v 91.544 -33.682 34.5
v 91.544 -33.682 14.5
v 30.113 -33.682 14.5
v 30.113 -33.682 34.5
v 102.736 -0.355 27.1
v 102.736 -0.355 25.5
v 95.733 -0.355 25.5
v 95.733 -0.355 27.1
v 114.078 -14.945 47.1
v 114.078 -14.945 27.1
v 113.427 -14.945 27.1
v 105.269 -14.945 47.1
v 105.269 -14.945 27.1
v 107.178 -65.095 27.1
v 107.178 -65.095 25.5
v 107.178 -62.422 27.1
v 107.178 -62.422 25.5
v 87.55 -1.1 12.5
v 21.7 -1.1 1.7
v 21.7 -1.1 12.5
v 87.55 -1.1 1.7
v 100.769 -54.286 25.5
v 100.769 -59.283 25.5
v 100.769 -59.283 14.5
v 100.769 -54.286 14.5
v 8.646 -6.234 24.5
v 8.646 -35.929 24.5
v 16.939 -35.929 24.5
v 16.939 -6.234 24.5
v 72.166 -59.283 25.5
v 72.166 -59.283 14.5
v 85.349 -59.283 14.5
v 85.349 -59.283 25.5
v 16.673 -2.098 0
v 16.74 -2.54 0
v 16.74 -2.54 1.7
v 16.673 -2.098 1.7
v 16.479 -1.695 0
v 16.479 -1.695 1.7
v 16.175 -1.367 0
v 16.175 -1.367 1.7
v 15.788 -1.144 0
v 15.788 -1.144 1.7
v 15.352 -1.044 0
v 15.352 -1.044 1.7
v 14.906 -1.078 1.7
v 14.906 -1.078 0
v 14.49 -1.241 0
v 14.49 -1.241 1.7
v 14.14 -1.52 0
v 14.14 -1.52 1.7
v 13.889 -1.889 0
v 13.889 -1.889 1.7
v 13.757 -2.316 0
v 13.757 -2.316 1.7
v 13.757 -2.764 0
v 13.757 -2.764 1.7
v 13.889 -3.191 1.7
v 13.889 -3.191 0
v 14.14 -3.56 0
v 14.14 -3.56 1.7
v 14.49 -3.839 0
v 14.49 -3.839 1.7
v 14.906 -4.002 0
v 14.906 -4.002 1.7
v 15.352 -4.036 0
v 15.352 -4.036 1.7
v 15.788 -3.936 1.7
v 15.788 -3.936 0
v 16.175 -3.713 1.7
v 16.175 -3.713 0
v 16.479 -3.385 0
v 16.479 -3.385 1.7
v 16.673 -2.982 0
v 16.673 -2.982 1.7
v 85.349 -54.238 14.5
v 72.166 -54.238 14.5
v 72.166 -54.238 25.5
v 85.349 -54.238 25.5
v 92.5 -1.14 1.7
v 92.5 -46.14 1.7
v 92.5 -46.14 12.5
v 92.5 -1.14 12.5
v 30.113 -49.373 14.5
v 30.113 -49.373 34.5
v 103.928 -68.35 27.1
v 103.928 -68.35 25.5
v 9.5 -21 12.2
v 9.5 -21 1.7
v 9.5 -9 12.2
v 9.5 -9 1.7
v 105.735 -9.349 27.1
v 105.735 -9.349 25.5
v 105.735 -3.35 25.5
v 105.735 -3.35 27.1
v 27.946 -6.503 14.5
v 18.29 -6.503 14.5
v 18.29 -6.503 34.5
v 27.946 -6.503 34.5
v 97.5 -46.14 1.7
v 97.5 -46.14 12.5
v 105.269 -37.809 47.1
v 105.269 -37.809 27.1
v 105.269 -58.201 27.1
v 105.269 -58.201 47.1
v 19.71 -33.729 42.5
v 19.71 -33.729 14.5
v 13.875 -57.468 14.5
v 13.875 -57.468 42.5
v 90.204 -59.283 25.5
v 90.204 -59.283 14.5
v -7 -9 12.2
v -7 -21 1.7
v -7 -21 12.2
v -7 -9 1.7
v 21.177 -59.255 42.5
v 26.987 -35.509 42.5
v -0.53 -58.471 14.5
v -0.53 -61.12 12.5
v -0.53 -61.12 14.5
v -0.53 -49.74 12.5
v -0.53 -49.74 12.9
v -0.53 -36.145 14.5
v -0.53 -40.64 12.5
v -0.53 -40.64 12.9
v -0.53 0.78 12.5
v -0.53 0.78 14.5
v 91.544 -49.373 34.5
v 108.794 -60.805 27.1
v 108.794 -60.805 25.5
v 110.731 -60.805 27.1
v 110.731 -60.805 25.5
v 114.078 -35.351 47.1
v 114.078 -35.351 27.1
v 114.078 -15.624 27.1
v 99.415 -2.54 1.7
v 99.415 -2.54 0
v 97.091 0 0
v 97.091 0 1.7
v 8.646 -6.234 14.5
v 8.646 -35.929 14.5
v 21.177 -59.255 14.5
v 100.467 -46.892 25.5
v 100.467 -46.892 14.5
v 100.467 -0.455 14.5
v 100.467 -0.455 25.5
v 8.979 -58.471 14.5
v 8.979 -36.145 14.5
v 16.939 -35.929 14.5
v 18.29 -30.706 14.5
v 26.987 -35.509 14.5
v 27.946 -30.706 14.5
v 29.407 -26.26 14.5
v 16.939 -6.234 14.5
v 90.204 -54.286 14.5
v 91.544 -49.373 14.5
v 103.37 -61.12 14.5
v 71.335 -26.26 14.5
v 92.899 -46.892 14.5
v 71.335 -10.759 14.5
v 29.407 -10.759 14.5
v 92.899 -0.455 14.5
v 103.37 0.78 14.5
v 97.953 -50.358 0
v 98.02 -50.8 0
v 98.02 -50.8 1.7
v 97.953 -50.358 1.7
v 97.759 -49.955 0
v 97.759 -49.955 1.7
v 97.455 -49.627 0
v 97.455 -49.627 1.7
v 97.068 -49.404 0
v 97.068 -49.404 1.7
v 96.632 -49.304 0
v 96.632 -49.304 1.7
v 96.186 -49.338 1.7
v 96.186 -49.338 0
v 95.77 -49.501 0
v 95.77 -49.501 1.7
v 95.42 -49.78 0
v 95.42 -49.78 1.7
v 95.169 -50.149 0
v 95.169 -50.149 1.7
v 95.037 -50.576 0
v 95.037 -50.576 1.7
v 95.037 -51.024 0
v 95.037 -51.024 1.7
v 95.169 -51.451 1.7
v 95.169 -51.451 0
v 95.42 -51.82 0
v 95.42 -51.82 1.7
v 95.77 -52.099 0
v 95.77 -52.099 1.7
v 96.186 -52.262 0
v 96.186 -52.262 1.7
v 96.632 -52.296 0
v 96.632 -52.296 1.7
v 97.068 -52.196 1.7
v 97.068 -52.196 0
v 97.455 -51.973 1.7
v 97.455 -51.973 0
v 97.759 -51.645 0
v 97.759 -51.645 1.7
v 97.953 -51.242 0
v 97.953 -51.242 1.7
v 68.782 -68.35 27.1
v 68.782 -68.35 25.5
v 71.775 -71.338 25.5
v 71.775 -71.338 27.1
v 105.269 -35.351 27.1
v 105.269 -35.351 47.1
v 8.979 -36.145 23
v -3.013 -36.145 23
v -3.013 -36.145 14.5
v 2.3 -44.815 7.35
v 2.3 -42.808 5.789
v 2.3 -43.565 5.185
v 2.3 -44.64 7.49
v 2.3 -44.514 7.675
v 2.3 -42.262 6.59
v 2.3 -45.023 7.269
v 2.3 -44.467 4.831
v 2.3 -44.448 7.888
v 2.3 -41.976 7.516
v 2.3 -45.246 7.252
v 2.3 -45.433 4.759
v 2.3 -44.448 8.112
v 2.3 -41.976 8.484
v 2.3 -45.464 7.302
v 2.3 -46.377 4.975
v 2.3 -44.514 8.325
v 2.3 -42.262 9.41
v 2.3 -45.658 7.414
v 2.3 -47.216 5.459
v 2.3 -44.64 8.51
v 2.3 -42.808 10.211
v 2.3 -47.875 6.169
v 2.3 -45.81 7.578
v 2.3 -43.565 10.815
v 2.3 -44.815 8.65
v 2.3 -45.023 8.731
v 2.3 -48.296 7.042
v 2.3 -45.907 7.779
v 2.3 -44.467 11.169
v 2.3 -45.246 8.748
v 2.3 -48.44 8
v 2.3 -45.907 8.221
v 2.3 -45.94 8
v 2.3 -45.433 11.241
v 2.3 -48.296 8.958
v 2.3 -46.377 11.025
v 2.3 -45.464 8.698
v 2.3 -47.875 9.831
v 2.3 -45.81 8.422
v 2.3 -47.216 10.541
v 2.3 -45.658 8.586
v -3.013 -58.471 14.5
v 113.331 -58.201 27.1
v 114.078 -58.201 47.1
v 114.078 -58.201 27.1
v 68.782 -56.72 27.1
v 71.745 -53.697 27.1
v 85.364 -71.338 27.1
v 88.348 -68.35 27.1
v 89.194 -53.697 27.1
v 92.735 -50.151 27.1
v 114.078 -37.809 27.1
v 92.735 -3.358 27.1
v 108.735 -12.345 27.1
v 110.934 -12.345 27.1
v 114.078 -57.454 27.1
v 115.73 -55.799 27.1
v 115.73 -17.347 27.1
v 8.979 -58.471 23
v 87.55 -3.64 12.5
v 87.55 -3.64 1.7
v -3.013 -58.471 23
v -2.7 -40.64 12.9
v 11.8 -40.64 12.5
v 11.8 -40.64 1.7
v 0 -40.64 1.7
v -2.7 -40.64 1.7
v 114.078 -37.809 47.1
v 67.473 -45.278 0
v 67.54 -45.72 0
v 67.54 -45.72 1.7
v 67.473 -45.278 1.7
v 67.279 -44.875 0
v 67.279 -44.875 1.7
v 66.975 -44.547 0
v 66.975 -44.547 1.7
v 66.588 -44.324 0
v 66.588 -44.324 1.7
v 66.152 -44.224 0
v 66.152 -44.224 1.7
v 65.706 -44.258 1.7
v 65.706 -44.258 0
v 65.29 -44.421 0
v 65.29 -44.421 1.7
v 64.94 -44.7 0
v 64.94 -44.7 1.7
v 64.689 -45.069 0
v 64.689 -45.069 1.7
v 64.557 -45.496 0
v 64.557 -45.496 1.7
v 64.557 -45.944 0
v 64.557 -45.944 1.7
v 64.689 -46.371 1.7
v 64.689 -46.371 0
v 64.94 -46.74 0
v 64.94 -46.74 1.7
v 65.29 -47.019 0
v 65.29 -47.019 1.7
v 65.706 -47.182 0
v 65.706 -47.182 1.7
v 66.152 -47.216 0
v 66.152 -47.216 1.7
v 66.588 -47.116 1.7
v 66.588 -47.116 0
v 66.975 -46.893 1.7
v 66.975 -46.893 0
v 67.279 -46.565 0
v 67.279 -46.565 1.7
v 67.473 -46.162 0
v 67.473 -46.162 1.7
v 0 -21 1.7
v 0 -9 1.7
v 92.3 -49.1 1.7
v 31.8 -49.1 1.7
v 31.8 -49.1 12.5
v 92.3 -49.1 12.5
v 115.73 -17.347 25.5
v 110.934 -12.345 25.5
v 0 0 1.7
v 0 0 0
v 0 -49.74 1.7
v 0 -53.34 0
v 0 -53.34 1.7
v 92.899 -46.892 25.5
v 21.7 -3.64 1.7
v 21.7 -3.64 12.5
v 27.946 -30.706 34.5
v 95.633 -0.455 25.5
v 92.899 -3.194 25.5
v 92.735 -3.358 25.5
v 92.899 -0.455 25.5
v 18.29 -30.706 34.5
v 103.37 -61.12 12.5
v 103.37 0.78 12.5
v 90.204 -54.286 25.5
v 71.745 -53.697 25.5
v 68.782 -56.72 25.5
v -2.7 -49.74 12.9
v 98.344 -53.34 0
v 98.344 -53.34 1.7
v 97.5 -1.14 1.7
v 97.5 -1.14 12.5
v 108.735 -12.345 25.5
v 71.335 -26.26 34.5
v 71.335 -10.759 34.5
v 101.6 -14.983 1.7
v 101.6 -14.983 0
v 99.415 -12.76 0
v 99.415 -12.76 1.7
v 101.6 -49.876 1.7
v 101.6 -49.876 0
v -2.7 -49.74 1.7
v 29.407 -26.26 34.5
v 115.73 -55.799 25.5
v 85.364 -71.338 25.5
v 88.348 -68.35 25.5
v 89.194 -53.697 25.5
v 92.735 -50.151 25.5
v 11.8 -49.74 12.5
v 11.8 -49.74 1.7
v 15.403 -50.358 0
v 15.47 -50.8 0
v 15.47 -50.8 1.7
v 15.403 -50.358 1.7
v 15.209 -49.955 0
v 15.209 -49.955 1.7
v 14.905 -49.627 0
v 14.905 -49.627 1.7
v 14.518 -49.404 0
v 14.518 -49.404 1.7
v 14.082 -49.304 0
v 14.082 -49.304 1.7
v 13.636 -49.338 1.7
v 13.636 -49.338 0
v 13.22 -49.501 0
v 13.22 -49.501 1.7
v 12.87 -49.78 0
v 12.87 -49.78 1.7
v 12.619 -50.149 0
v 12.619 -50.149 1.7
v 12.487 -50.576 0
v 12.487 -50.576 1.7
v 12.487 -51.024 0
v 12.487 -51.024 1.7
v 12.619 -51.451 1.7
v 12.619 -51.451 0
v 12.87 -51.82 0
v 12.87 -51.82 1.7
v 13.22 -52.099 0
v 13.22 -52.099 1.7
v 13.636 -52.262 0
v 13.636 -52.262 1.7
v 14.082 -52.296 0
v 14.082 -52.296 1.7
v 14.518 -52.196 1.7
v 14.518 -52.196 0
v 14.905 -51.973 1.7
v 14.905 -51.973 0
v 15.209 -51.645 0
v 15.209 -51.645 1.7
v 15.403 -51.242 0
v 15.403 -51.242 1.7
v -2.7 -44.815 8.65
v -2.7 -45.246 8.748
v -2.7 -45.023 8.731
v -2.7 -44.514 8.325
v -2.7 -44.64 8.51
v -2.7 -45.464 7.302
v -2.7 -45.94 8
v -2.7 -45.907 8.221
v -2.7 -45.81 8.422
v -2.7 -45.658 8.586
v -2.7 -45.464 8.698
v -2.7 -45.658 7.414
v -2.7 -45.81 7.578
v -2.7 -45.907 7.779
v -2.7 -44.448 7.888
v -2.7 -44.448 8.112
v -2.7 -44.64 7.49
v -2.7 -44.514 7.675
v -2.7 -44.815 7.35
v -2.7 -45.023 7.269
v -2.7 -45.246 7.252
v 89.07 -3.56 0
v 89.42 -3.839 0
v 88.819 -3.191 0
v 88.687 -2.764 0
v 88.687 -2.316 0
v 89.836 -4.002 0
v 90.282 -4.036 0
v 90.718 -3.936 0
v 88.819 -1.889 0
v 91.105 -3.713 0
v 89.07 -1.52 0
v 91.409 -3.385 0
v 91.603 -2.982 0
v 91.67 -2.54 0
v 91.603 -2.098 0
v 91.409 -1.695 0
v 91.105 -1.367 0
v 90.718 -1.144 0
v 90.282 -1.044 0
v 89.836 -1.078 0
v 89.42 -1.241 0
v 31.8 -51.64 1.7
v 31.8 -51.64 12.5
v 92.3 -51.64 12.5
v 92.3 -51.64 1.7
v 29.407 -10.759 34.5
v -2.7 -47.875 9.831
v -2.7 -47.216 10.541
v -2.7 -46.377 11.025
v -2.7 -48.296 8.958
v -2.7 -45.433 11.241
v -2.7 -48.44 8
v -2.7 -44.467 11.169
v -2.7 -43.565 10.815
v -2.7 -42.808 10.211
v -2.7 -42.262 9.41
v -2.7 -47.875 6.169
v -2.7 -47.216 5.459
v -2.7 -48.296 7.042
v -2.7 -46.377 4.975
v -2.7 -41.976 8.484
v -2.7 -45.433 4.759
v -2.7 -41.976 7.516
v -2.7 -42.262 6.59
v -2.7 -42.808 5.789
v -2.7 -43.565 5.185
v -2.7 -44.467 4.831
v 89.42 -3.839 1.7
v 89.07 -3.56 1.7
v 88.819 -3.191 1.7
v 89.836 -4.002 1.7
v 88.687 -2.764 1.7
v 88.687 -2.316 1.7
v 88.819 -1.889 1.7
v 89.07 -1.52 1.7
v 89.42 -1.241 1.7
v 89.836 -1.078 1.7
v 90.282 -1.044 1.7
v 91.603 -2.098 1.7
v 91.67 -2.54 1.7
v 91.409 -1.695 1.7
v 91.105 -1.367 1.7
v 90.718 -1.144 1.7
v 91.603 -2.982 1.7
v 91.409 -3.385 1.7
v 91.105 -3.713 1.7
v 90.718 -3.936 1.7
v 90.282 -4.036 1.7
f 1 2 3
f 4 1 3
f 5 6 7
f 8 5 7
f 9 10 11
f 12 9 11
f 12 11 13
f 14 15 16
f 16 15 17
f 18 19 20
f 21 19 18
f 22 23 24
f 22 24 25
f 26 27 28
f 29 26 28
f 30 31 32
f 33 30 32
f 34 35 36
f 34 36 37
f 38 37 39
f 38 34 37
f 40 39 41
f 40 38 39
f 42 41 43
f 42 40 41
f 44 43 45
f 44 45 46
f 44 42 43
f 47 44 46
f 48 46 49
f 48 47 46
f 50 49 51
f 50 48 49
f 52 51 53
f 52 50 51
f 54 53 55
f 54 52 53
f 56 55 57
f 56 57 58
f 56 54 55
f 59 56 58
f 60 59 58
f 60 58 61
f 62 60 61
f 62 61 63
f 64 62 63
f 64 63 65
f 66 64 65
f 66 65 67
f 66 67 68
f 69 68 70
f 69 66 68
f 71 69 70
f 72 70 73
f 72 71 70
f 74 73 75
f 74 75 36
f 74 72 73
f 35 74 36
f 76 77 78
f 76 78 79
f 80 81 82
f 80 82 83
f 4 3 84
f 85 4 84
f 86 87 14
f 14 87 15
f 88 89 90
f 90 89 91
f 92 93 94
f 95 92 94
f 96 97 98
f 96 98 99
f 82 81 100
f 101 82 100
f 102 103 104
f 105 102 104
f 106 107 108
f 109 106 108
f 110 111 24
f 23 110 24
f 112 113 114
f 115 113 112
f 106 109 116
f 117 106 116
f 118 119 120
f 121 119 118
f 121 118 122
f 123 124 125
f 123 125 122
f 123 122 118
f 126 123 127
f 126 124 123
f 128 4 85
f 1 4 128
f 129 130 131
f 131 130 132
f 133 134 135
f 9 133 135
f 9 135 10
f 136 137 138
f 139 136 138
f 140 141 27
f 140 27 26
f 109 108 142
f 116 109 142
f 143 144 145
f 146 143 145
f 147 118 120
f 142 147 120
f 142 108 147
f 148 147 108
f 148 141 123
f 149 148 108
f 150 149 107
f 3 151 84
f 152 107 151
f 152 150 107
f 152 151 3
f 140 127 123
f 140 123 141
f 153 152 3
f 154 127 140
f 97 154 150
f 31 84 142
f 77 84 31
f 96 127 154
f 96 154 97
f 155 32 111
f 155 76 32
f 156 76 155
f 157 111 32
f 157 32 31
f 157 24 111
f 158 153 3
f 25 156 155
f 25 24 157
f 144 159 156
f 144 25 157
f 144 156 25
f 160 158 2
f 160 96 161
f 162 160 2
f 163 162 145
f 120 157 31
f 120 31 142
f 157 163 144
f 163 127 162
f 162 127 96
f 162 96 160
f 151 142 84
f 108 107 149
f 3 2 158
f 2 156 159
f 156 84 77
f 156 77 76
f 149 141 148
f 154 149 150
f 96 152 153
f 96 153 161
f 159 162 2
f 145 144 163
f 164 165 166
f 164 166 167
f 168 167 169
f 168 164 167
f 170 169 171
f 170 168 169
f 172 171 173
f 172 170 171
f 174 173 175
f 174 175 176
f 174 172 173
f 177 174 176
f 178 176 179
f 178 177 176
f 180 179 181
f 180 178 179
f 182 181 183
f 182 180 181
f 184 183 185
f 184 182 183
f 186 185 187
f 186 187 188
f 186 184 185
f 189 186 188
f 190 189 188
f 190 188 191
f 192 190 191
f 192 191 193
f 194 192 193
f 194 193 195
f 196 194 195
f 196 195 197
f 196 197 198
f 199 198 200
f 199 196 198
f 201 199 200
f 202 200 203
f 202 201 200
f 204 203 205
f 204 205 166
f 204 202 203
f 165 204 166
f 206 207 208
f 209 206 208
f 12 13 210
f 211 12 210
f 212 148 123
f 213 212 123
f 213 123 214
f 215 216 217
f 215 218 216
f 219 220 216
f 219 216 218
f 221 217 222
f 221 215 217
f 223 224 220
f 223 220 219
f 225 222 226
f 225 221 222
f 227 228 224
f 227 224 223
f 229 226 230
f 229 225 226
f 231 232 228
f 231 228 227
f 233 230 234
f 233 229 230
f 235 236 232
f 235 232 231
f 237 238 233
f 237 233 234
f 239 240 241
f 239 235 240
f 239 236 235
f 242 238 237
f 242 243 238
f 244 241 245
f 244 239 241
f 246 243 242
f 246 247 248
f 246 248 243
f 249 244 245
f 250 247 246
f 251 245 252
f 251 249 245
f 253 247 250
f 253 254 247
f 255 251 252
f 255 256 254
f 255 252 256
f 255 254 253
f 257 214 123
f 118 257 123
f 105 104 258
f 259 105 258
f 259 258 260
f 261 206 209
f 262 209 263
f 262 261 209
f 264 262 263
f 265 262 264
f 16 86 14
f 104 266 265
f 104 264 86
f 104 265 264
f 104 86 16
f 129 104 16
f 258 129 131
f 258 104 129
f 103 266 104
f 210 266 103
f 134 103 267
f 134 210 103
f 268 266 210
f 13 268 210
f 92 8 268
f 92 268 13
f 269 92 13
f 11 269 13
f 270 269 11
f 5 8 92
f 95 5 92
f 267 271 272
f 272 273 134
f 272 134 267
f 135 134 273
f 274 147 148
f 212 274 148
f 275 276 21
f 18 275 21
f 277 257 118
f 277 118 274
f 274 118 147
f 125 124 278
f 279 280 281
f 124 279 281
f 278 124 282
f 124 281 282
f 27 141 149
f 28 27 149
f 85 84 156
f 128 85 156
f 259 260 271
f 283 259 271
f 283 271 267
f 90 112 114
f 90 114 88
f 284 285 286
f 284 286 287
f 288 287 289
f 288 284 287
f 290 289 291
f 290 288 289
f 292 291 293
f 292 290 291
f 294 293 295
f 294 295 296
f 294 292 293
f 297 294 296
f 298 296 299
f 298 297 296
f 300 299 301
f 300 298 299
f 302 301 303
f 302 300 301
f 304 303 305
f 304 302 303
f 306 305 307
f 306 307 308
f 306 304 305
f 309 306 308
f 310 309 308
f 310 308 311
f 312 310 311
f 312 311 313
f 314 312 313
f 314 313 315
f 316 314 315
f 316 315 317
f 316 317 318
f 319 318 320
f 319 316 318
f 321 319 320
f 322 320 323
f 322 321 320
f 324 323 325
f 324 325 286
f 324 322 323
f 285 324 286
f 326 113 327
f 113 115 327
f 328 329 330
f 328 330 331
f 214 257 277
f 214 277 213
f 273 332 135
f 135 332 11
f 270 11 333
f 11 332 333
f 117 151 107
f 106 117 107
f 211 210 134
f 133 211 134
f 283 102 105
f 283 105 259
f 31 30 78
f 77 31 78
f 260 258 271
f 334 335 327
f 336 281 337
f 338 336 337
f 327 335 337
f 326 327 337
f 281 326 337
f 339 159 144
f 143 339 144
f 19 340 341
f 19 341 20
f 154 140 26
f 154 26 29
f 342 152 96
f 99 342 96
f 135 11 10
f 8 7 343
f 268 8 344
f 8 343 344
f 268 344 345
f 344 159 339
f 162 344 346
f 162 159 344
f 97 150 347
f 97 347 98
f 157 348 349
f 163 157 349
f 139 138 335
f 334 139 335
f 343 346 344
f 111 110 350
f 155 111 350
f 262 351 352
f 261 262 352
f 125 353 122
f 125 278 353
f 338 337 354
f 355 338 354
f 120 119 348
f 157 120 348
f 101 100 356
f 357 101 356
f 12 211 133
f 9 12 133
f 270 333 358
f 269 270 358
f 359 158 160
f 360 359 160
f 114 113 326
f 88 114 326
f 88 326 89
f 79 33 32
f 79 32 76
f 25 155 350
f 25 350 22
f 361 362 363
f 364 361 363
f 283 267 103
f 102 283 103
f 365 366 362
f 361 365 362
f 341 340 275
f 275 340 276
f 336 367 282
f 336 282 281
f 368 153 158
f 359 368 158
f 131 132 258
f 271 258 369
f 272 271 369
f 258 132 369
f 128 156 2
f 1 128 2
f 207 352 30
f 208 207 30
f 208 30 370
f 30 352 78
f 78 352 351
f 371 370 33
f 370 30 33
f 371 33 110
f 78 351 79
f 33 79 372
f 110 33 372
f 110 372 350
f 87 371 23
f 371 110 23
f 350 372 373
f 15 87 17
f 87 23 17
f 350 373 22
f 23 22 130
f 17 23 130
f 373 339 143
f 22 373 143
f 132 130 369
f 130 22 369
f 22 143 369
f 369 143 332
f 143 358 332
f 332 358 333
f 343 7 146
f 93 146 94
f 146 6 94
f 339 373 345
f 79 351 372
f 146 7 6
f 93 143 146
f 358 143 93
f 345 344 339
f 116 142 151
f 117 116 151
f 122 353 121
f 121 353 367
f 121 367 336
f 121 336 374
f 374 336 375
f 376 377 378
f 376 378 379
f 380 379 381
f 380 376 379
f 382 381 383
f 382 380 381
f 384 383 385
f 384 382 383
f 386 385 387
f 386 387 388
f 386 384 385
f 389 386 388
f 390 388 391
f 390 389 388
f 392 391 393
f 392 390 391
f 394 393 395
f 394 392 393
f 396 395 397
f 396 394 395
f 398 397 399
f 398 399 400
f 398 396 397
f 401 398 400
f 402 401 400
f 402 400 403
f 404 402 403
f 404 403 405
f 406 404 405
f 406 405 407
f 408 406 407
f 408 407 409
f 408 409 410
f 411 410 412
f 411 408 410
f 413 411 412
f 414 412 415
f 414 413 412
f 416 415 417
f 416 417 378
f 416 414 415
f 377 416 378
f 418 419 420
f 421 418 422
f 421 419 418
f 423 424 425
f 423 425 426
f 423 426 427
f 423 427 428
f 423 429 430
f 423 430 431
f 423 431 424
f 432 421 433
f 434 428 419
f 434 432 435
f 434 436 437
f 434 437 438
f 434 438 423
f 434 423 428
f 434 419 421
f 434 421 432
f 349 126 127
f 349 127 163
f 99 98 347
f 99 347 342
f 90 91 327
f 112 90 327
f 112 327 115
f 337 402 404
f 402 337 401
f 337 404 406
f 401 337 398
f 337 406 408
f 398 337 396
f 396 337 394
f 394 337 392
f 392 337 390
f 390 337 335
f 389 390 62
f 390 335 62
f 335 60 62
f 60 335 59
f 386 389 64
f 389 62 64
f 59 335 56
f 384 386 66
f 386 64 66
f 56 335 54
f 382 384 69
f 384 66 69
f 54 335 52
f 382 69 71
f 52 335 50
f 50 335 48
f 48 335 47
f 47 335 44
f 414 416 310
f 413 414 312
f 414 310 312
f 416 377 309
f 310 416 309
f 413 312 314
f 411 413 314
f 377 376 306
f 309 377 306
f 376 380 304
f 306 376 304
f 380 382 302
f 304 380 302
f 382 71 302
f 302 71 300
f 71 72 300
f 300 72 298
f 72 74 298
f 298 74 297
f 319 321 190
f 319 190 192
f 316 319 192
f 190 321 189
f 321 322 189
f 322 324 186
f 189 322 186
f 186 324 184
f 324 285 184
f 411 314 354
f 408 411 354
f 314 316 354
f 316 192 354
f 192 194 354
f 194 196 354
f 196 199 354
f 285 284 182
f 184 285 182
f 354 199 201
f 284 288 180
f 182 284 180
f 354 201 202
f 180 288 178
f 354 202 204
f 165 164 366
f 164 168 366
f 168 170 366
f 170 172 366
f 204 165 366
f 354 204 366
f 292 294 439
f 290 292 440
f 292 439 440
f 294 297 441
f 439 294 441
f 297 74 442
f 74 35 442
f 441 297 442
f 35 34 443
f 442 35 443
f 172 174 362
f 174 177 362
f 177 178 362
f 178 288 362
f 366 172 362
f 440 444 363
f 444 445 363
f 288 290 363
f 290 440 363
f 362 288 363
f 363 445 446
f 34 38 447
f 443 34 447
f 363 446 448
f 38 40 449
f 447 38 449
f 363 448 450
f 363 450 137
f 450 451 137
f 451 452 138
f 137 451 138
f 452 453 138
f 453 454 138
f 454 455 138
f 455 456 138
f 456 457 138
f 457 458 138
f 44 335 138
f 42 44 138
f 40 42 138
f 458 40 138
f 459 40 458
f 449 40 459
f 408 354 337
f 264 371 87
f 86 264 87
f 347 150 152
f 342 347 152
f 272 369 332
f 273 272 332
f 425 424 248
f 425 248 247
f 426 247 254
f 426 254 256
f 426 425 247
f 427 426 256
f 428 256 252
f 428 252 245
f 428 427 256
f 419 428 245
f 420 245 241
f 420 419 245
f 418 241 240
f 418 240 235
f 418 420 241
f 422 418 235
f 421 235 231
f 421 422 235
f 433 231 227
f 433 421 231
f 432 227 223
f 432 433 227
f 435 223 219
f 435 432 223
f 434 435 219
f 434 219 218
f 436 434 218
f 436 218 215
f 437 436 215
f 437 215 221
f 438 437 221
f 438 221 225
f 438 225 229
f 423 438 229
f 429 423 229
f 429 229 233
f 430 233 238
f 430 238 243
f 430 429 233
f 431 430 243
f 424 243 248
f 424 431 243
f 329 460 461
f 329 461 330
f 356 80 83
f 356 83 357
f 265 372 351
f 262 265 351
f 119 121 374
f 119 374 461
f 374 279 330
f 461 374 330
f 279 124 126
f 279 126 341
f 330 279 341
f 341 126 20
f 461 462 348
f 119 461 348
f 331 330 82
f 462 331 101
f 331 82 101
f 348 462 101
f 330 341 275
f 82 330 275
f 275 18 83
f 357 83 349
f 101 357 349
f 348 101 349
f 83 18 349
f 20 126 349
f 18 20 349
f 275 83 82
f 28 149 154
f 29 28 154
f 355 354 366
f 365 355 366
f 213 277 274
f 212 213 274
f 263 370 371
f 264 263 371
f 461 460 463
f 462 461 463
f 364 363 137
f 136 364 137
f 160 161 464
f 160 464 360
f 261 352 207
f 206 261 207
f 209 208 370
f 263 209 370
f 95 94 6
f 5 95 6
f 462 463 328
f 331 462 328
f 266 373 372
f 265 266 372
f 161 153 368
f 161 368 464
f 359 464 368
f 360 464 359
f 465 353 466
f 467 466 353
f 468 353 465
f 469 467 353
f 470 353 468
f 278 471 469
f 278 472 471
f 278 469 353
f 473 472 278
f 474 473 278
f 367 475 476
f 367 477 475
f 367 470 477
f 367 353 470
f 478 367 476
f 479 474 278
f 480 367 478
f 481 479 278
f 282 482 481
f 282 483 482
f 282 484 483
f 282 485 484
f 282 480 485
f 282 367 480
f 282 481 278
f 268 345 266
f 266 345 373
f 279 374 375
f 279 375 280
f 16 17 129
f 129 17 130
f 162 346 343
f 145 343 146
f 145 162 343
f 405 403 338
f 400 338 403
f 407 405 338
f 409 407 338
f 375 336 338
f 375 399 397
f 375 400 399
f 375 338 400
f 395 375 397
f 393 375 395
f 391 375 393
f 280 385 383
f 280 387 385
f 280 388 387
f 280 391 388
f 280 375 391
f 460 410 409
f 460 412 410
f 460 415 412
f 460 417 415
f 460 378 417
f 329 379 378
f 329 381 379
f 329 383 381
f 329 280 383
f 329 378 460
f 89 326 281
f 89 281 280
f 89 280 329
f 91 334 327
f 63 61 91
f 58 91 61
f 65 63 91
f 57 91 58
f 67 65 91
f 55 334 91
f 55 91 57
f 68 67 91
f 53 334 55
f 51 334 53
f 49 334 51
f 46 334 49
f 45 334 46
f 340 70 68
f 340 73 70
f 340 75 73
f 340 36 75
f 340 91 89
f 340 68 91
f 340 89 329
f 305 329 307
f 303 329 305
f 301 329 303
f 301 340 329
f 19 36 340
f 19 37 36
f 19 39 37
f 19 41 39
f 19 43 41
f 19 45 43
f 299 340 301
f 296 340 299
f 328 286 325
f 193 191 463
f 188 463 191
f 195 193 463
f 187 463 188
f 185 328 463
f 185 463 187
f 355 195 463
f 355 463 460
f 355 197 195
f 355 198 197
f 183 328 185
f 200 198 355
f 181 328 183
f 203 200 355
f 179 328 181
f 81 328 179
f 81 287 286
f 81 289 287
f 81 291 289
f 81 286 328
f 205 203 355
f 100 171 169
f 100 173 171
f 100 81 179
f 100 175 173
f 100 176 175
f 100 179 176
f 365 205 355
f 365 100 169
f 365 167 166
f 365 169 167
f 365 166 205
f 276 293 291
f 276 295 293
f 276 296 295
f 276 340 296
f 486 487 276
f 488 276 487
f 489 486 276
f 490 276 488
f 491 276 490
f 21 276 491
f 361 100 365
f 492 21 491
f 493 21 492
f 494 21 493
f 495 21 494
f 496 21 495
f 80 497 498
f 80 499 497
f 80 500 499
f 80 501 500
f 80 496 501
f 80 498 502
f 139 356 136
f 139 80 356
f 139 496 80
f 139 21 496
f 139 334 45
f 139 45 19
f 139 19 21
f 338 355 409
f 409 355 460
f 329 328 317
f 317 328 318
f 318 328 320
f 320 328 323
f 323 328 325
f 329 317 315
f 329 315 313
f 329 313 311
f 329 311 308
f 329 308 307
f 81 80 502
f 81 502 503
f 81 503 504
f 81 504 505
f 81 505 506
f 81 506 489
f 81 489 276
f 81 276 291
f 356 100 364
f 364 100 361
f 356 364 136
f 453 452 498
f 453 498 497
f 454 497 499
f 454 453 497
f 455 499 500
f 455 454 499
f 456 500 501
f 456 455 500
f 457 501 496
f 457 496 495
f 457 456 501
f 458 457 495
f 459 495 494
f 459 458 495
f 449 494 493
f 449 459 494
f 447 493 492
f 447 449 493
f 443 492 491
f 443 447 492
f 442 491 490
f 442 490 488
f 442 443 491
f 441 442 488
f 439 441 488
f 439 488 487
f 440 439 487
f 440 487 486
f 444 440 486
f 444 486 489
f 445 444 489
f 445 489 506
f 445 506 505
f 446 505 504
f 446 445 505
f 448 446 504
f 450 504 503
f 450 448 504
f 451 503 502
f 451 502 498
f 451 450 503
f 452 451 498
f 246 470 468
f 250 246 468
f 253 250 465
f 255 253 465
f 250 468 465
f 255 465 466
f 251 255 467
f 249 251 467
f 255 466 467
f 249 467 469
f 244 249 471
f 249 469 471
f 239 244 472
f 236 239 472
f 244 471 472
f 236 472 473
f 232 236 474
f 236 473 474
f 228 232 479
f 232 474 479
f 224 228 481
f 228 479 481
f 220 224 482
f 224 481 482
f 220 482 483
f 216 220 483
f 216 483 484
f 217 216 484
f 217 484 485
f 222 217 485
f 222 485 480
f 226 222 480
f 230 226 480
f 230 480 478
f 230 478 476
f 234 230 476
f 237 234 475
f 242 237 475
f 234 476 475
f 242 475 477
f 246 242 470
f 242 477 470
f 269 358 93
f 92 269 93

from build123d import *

# Parameters (mm, degrees)
F0_R      = 1.5
F1_DEPTH  = 1.7
F2_W      = 11.8
F2_H      = 9.1
F2_W_2    = 2.7
F3_DEPTH  = 11.2
F4_R      = 3.25
F4_R_2    = 0.75
F5_DEPTH  = 5
F2_W_3    = 9.5
F2_H_2    = 12
F2_W_4    = 7
F6_DEPTH  = 10.5
F2_W_5    = 65.85
F2_H_3    = 2.54
F2_W_6    = 5
F2_H_4    = 45
F2_W_7    = 60.5
F7_DEPTH  = 10.8
F9_W      = 103.9
F9_H      = 61.9
F10_DEPTH = 2
F11_W     = 2.4829882507
F11_H     = 22.3256796598
F11_W_2   = 9.5090560305
F12_DEPTH = 8.5
F11_W_3   = 8.2931313664
F11_H_2   = 29.6949772164
F13_DEPTH = 10
F11_W_4   = 9.6561443061
F11_H_3   = 24.203886278
F14_DEPTH = 20
F15_DEPTH = 28
F11_W_5   = 41.9279932976
F11_H_4   = 15.5006516725
F16_DEPTH = 20
F11_W_6   = 13.1828933954
F11_H_5   = 5.0447173417
F11_W_7   = 10.5653479695
F11_H_6   = 4.9971267581
F11_W_8   = 7.5681805611
F11_H_7   = 46.4369145338
F17_DEPTH = 11
F20_DEPTH = 1.6
F22_DEPTH = 20


with BuildPart() as f1:
    # F0 (on Top) → F1 (new body)
    with BuildSketch(Plane.XY):
        Polygon((97.0912873745, 0), (0, 0), (0, -53.34), (98.3443260193, -53.34), (101.6, -49.8757660389), (101.6, -14.9831408635), (99.4149968028, -12.760464102), (99.4149968028, -2.54), align=None)
        with Locations((13.97, -50.8)):
            Circle(F0_R, mode=Mode.SUBTRACT)
        with Locations((66.04, -45.72)):
            Circle(F0_R, mode=Mode.SUBTRACT)
        with Locations((96.52, -50.8)):
            Circle(F0_R, mode=Mode.SUBTRACT)
        with Locations((15.24, -2.54)):
            Circle(F0_R, mode=Mode.SUBTRACT)
        with Locations((90.17, -2.54)):
            Circle(F0_R, mode=Mode.SUBTRACT)
    extrude(amount=F1_DEPTH)

    # F2 (on face) → F3 (join)
    with BuildSketch(Plane.XY.offset(1.7)):
        with Locations((5.9, -45.19)):
            Rectangle(F2_W, F2_H)
        with Locations((-1.35, -45.19)):
            Rectangle(F2_W_2, F2_H)
    extrude(amount=F3_DEPTH)

    # F4 (on face) → F5 (cut)
    with BuildSketch(Plane(origin=(-2.7, 0, 0), x_dir=(0, -1, 0), z_dir=(-1, 0, 0))):
        with Locations((45.19, 8)):
            Circle(F4_R)
        with Locations((45.19, 8)):
            Circle(F4_R_2, mode=Mode.SUBTRACT)
    extrude(amount=-F5_DEPTH, mode=Mode.SUBTRACT)

    # F2 (on face) → F6 (join)
    with BuildSketch(Plane.XY.offset(1.7)):
        with Locations((4.75, -15)):
            Rectangle(F2_W_3, F2_H_2)
        with Locations((-3.5, -15)):
            Rectangle(F2_W_4, F2_H_2)
    extrude(amount=F6_DEPTH)

    # F2 (on face) → F7 (join)
    with BuildSketch(Plane.XY.offset(1.7)):
        with Locations((54.625, -2.37)):
            Rectangle(F2_W_5, F2_H_3)
        with Locations((95, -23.64)):
            Rectangle(F2_W_6, F2_H_4)
        with Locations((62.05, -50.37)):
            Rectangle(F2_W_7, F2_H_3)
    extrude(amount=F7_DEPTH)

    # F9 (on offset) → F10 (join)
    with BuildSketch(Plane.XY.offset(12.5)):
        with Locations((51.42, -30.17)):
            Rectangle(F9_W, F9_H)
    extrude(amount=F10_DEPTH)

    # F11 (on face) → F12 (join)
    with BuildSketch(Plane.XY.offset(14.5)):
        with Locations((-1.7714941254, -47.3081059754)):
            Rectangle(F11_W, F11_H)
        with Locations((4.2245280153, -47.3081059754)):
            Rectangle(F11_W_2, F11_H)
    extrude(amount=F12_DEPTH)

    # F11 (on face) → F13 (join)
    with BuildSketch(Plane.XY.offset(14.5)):
        with Locations((12.792323716, -21.0819304921)):
            Rectangle(F11_W_3, F11_H_2)
    extrude(amount=F13_DEPTH)

    # F11 (on face) → F14 (join)
    with BuildSketch(Plane.XY.offset(14.5)):
        with Locations((23.1177126989, -18.6045370065)):
            Rectangle(F11_W_4, F11_H_3)
    extrude(amount=F14_DEPTH)

    # F11 (on face) → F15 (join)
    with BuildSketch(Plane.XY.offset(14.5)):
        Polygon((26.9871652126, -35.5093516409), (19.7103302926, -33.7288491428), (13.8745306454, -57.4684444644), (21.1770047413, -59.2552203791), align=None)
    extrude(amount=F15_DEPTH)

    # F11 (on face) → F16 (join)
    with BuildSketch(Plane.XY.offset(14.5)):
        Polygon((30.1127098501, -33.6817987263), (30.1127098501, -49.3730306625), (91.5435701609, -49.3730306625), (91.5435701609, -33.6817987263), (86.4100605249, -33.6817987263), (76.222717762, -33.6817987263), align=None)
        with Locations((50.3709092736, -18.5092454776)):
            Rectangle(F11_W_5, F11_H_4)
    extrude(amount=F16_DEPTH)

    # F11 (on face) → F17 (join)
    with BuildSketch(Plane.XY.offset(14.5)):
        with Locations((78.7578299642, -56.7604172975)):
            Rectangle(F11_W_6, F11_H_5)
        with Locations((95.4863019288, -56.7842125893)):
            Rectangle(F11_W_7, F11_H_6)
        with Locations((96.6827124357, -23.6736045626)):
            Rectangle(F11_W_8, F11_H_7)
    extrude(amount=F17_DEPTH)

    # F19 (on offset) → F20 (join)
    with BuildSketch(Plane.XY.offset(25.5)):
        Polygon((92.734746635, -50.1511096954), (89.1940370202, -53.6969974637), (71.7452839017, -53.6969974637), (68.7820387674, -56.720264256), (68.7820387674, -68.3501685575), (71.7745572329, -71.3383169692), (85.3640451386, -71.3383169692), (88.3478298783, -68.3501685575), (103.9278417004, -68.3501685575), (107.1784873109, -65.094769001), (107.1784873109, -62.4223748591), (108.7936833501, -60.804816657), (110.7314362108, -60.804816657), (115.7298460603, -55.7990968227), (115.7298460603, -17.3471495509), (110.9337881207, -12.3451392372), (108.7346714968, -12.3451392372), (105.7346100416, -9.3494588509), (105.7346100416, -3.3496673639), (102.7355343103, -0.3549712621), (95.7330679293, -0.3549712621), (92.734746635, -3.3576774877), align=None)
    extrude(amount=F20_DEPTH)

    # F21 (on face) → F22 (join)
    with BuildSketch(Plane.XY.offset(27.1)):
        Polygon((113.4268465994, -14.9452546611), (114.0775308013, -15.6238805514), (114.0775308013, -14.9452546611), align=None)
        Polygon((105.269394815, -14.9452546611), (105.269394815, -35.3506803513), (114.0775308013, -35.3506803513), (114.0775308013, -15.6238805514), (113.4268465994, -14.9452546611), align=None)
        Polygon((114.0775308013, -58.2013837993), (114.0775308013, -57.4538285301), (113.3310672068, -58.2013837993), align=None)
        Polygon((113.3310672068, -58.2013837993), (114.0775308013, -57.4538285301), (114.0775308013, -37.8092862666), (105.269394815, -37.8092862666), (105.269394815, -58.2013837993), align=None)
    extrude(amount=F22_DEPTH)


solid = f1.part
